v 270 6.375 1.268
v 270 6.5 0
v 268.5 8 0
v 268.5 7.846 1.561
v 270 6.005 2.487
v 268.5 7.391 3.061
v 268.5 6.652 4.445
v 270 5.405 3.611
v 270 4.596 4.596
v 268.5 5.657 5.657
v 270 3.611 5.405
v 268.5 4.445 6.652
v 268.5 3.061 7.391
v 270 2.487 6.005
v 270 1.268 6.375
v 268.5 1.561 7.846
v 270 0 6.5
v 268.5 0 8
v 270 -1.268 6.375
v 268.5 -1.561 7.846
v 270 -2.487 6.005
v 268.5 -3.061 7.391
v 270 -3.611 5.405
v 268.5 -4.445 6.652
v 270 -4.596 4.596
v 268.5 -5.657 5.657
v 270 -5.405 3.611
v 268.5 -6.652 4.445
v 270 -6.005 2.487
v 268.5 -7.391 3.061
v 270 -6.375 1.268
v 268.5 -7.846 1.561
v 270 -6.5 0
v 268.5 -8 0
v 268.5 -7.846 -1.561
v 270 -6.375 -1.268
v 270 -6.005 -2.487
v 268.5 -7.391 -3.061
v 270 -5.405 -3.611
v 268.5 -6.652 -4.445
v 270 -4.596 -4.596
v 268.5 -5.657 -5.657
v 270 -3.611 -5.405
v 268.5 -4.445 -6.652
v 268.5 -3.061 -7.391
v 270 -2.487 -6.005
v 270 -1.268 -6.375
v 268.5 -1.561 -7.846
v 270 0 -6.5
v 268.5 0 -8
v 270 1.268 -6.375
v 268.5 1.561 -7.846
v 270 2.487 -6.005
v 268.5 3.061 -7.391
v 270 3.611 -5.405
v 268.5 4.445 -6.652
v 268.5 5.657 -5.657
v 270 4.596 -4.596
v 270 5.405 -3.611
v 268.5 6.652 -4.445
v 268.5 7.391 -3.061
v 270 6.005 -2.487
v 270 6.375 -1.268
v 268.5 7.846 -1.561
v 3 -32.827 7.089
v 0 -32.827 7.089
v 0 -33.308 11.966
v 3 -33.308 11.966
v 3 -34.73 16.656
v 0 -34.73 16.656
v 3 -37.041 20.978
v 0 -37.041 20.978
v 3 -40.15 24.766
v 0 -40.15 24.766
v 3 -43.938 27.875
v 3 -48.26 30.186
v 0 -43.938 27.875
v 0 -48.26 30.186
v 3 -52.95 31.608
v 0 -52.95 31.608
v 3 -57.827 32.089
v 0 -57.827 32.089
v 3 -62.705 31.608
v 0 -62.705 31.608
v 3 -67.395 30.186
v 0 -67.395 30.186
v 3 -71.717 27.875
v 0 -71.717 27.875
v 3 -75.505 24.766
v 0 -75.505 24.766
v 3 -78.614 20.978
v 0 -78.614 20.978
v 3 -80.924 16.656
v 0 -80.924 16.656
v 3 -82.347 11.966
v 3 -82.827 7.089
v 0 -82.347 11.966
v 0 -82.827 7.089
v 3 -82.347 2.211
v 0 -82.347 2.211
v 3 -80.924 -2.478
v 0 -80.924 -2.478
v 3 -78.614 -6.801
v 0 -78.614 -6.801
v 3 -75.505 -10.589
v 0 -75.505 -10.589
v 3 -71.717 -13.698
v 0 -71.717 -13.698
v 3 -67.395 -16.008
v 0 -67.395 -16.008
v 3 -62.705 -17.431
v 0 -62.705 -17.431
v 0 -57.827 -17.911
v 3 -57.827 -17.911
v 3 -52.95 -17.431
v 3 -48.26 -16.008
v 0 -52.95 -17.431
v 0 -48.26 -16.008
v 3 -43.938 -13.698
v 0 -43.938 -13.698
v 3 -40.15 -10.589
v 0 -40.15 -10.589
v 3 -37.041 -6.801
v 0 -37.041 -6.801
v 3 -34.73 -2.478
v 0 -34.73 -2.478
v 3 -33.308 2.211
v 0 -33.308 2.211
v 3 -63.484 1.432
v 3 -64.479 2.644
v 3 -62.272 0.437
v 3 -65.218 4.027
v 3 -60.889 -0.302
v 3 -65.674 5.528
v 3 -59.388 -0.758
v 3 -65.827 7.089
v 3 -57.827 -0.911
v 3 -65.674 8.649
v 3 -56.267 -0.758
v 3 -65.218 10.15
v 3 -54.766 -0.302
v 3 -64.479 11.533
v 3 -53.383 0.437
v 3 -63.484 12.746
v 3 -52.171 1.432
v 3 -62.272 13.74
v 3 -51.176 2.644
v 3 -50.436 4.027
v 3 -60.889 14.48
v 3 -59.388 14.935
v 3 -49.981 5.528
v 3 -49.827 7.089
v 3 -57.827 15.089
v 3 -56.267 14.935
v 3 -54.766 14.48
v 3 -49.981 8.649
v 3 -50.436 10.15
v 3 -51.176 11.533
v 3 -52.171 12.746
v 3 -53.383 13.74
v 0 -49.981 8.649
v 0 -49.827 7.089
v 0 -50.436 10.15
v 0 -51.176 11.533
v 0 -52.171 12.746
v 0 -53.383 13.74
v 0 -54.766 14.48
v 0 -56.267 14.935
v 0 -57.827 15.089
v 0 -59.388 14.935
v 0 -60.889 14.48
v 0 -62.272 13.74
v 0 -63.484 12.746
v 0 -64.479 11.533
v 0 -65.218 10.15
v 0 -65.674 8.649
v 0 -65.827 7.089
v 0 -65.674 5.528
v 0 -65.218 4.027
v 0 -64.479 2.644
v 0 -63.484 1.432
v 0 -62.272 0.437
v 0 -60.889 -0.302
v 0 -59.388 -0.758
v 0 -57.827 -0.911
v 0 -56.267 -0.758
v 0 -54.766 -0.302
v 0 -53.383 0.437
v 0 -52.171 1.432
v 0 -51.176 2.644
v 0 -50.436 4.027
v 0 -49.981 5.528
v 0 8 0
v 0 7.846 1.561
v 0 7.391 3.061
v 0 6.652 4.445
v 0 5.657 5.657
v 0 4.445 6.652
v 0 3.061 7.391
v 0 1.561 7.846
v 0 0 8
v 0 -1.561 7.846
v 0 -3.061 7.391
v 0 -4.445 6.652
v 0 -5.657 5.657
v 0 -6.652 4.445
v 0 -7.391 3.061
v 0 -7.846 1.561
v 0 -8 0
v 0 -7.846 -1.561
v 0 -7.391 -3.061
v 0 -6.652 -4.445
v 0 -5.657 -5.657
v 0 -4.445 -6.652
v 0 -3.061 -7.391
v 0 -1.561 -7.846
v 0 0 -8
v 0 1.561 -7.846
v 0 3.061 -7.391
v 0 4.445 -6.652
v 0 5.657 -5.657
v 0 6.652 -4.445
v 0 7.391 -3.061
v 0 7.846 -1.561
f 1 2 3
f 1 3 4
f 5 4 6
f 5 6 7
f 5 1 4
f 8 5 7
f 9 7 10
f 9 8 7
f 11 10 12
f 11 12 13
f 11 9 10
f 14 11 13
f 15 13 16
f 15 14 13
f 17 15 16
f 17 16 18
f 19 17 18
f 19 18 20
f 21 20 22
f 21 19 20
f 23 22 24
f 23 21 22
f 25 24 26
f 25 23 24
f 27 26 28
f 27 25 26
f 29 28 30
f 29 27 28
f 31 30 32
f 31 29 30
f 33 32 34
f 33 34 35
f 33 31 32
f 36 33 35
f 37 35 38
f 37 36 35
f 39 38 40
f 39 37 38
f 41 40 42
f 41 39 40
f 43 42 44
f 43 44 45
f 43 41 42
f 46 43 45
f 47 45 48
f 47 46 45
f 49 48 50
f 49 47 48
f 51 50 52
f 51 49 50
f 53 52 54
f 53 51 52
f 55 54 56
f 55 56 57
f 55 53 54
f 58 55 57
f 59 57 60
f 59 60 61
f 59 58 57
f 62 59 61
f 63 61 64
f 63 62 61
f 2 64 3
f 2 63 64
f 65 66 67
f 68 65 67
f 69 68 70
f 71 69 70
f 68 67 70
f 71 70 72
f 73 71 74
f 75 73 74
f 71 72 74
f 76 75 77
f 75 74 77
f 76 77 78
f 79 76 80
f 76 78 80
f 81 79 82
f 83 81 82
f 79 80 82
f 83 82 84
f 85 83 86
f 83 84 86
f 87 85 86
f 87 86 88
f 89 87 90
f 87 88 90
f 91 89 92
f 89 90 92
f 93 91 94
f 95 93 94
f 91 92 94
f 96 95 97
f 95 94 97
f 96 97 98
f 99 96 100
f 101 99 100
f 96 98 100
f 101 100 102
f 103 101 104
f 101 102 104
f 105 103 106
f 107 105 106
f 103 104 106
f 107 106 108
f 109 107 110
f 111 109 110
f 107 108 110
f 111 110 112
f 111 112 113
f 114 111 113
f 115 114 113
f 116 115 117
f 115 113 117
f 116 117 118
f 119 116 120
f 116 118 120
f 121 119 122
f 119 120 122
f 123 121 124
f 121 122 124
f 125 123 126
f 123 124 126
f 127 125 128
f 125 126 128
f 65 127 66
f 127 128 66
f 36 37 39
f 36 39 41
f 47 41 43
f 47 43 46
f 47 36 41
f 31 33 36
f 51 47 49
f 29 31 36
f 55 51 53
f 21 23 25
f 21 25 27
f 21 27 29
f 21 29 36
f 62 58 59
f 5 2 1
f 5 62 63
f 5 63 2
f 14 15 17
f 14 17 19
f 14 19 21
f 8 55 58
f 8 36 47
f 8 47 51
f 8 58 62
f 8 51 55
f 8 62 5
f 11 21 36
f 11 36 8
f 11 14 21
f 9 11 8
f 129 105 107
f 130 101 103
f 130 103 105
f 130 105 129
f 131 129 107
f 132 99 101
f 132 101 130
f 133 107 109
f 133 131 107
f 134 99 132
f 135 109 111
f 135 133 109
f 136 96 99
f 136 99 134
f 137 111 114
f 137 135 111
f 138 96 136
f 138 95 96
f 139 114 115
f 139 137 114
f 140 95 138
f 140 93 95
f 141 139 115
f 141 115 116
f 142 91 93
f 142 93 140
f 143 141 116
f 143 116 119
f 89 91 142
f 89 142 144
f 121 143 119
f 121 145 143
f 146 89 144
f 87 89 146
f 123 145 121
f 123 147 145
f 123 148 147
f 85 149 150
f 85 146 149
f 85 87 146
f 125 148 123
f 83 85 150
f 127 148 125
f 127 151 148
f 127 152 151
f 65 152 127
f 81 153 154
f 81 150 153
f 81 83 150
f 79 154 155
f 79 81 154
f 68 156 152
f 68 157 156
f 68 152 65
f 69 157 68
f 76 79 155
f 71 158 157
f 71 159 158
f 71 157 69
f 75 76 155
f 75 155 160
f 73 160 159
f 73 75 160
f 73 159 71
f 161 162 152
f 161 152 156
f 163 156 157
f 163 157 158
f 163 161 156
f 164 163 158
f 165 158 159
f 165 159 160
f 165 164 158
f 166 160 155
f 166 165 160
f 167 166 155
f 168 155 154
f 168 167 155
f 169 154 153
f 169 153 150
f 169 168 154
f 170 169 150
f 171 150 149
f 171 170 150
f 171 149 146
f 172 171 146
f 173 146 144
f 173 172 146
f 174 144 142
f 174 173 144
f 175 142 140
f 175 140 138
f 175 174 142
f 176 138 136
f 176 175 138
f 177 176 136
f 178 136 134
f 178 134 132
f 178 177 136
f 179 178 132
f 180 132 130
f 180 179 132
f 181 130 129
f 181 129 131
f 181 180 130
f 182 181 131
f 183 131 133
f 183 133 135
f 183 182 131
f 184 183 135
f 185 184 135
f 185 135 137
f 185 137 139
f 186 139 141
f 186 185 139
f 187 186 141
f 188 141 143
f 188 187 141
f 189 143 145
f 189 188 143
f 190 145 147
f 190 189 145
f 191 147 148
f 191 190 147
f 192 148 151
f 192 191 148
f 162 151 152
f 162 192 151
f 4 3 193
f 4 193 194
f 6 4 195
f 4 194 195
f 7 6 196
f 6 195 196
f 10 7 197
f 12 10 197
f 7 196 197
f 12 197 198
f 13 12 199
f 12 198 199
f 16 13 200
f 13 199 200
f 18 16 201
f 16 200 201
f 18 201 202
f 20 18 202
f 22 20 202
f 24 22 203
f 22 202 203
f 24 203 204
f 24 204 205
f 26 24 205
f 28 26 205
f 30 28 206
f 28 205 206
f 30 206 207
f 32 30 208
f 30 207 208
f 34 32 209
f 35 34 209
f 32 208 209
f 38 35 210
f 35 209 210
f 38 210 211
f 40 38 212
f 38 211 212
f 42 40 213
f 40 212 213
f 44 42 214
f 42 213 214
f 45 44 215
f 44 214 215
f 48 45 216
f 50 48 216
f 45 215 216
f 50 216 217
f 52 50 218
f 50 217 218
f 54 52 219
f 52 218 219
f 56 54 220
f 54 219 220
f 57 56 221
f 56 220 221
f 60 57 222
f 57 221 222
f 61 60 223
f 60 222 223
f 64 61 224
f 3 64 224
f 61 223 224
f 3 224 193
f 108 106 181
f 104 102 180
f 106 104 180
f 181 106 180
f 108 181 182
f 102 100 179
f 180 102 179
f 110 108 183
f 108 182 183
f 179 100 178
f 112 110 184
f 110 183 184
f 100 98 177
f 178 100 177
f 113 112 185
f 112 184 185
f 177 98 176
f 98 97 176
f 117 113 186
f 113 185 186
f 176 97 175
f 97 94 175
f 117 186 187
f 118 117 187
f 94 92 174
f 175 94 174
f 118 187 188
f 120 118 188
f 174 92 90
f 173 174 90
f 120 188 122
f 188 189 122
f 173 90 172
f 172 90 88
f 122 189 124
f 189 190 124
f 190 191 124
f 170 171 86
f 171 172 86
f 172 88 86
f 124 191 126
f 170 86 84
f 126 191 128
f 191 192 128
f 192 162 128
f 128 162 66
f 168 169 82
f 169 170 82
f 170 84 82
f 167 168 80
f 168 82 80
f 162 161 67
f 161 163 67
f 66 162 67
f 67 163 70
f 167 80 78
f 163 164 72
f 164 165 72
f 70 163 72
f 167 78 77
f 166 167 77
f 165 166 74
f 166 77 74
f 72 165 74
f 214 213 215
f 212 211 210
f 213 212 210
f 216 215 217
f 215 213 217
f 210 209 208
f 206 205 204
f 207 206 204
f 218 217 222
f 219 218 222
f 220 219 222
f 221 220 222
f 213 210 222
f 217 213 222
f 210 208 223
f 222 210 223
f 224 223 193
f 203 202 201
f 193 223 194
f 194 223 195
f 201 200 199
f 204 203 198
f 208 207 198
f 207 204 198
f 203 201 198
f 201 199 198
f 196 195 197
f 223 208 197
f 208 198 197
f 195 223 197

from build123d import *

# Parameters (mm, degrees)
F0_R     = 8
F1_DEPTH = 270
F2_SIZE  = 1.5
F3_R     = 25
F3_R_2   = 8
F4_DEPTH = 3


with BuildPart() as f1:
    # F0 (on Right) → F1 (new body)
    with BuildSketch(Plane.YZ):
        Circle(F0_R)
    extrude(amount=F1_DEPTH)

    # F2
    f2_edges = [f1.edges().sort_by_distance(p)[0] for p in [
        (270, -8, 0),
    ]]
    chamfer(f2_edges, length=F2_SIZE)


with BuildPart() as f4:
    # F3 (on Right) → F4 (new body)
    with BuildSketch(Plane.YZ):
        with Locations((-57.827432, 7.088691)):
            Circle(F3_R)
        with Locations((-57.827432, 7.088691)):
            Circle(F3_R_2, mode=Mode.SUBTRACT)
    extrude(amount=F4_DEPTH)


solid = Compound([f1.part, f4.part])
